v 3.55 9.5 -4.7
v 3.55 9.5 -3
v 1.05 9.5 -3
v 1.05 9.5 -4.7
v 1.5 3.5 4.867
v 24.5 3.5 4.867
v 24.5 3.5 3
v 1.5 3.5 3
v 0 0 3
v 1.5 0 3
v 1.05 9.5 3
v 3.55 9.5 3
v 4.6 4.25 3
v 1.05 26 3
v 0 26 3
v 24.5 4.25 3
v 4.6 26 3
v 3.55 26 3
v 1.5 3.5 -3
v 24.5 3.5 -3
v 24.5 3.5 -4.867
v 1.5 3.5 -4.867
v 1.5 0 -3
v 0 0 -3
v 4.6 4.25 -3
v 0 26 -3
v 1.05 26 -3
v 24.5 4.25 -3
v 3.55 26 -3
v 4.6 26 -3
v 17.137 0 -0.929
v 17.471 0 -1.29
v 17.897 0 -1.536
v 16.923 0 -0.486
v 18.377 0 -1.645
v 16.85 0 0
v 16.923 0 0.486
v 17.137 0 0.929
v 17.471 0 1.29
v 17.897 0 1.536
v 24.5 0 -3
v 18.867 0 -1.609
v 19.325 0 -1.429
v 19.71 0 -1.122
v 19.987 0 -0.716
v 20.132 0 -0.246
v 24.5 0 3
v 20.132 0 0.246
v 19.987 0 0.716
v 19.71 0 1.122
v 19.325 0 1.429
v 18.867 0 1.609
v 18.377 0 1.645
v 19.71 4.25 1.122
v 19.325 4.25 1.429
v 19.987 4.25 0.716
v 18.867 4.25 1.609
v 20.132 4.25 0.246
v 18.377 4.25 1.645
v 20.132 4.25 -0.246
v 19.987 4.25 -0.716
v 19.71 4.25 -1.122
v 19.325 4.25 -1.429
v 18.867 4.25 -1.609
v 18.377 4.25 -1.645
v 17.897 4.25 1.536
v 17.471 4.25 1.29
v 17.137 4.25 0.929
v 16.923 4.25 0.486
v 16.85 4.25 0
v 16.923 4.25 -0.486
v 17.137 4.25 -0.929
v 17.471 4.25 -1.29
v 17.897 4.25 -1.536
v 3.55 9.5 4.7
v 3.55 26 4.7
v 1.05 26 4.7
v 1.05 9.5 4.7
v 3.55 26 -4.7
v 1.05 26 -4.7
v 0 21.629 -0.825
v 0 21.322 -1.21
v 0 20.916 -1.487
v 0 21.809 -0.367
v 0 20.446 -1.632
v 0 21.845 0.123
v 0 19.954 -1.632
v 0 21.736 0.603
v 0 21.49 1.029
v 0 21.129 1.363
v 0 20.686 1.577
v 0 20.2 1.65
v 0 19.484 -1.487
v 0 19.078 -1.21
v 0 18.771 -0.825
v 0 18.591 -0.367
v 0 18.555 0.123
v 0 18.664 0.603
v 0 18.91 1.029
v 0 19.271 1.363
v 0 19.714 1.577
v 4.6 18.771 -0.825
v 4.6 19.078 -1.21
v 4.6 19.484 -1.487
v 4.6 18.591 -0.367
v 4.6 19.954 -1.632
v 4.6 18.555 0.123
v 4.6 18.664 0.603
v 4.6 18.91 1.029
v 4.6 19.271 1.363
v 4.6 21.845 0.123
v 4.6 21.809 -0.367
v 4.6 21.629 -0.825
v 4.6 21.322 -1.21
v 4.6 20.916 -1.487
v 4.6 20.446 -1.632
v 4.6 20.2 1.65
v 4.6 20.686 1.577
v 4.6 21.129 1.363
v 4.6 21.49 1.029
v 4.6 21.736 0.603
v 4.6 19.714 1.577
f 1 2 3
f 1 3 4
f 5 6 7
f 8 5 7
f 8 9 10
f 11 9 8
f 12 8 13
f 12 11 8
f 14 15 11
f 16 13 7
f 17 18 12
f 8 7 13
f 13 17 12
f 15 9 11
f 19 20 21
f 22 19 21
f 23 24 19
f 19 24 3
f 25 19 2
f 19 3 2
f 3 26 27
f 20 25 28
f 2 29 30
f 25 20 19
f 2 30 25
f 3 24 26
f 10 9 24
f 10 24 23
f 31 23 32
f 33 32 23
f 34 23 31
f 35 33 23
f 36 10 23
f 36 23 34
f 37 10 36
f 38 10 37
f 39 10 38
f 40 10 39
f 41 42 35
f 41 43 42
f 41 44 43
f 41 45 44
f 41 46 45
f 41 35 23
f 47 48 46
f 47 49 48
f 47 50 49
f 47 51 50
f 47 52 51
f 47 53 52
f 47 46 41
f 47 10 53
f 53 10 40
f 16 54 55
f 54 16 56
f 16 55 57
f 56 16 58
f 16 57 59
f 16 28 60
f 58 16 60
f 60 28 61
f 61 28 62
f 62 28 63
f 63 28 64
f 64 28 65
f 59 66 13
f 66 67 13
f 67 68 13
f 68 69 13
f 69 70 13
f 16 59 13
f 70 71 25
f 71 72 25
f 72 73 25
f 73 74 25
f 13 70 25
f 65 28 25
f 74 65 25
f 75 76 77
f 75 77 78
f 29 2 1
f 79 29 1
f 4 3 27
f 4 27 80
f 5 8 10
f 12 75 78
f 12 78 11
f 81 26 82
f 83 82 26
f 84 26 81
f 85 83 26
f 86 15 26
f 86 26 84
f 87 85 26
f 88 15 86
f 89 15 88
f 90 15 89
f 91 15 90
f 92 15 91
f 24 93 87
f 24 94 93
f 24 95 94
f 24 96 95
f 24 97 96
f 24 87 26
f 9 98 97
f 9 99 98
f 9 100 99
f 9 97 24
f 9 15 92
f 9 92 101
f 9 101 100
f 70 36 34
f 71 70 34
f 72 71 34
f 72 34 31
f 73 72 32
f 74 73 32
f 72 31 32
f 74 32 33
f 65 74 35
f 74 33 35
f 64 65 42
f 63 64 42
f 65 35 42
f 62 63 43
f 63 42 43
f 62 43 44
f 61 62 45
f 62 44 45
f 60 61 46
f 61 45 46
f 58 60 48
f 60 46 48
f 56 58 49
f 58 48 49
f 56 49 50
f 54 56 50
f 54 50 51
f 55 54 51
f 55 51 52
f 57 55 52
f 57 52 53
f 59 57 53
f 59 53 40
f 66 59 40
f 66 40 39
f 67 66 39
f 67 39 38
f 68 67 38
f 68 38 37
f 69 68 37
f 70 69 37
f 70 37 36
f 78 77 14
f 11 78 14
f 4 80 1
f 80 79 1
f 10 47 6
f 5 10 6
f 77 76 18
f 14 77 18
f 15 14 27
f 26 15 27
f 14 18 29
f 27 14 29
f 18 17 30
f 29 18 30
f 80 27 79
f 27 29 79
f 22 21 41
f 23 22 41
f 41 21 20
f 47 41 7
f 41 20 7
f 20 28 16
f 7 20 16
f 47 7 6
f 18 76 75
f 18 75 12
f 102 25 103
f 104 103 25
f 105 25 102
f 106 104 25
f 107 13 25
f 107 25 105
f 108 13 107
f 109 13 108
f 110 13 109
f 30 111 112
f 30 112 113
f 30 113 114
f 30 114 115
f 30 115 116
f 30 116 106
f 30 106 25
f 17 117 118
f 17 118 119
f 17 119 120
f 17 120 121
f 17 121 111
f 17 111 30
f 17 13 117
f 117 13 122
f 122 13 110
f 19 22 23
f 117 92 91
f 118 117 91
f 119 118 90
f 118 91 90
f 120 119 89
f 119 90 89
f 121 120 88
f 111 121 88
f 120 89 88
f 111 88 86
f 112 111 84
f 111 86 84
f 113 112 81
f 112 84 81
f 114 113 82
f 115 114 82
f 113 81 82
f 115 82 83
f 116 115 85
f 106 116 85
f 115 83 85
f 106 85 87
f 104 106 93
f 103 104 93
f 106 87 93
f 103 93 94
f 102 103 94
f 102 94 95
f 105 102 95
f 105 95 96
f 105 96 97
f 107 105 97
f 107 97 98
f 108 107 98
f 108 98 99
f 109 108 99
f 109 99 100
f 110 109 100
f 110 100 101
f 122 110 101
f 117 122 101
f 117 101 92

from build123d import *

# Parameters (mm, degrees)
BOSS_EXTRUDE1_DEPTH   = 3
BOSS_EXTRUDE2_DEPTH   = 24
SKETCH3_W             = 1.3
SKETCH3_H             = 10.4
BOSS_EXTRUDE3_DEPTH   = 16.5
M4X0_7_TAPPED_HOLE1_D = 3.3
M4X0_7_TAPPED_HOLE2_D = 3.3
SKETCH9_W             = 3
SKETCH9_H             = 3
CUT_EXTRUDE1_DEPTH    = 38.329478968
MOVE_FACE1_BY         = 0.75
MOVE_FACE2_BY         = 0.4
MOVE_FACE3_BY         = 0.75
MOVE_FACE3_2_BY       = 0.75
MOVE_FACE4_BY         = 0.45
MOVE_FACE4_2_BY       = 0.45
MOVE_FACE5_BY         = 0.5
MOVE_FACE5_2_BY       = 0.5
MOVE_FACE6_BY         = 1
MOVE_FACE8_BY         = 0.25
MOVE_FACE8_2_BY       = 0.25


with BuildPart() as part:
    # Sketch1 → Boss-Extrude1 (new, symmetric)
    with BuildSketch(Plane.XY):
        with BuildLine():
            Line((0, 26), (0, 0))
            Line((0, 0), (25.5, 0))
            Line((25.5, 0), (25.5, 5))
            Line((25.5, 5), (8, 5))
            ThreePointArc((8, 5), (5.878679656, 5.878679656), (5, 8))
            Line((5, 8), (5, 26))
            Line((5, 26), (0, 26))
        make_face()
    extrude(amount=BOSS_EXTRUDE1_DEPTH, both=True)

    # Sketch2 → Boss-Extrude2 (add)
    with BuildSketch(Plane(origin=(25.5, 0, 0), x_dir=(0, 0, -1), z_dir=(1, 0, 0))):
        Polygon((-3, 0), (-5, 3.75), (5, 3.75), (3, 0), align=None)
    extrude(amount=-BOSS_EXTRUDE2_DEPTH)

    # Sketch3 → Boss-Extrude3 (add)
    with BuildSketch(Plane(origin=(0, 26, 0), x_dir=(1, 0, 0), z_dir=(0, 1, 0))):
        with Locations((2.15, 0)):
            Rectangle(SKETCH3_W, SKETCH3_H)
    extrude(amount=-BOSS_EXTRUDE3_DEPTH)

    # M4x0.7 Tapped Hole1 (through all)
    with Locations(Plane(origin=(0, 5, 0), x_dir=(1, 0, 0), z_dir=(0, 1, 0))):
        with Locations((18.5, 0)):
            Hole(M4X0_7_TAPPED_HOLE1_D / 2)

    # M4x0.7 Tapped Hole2 (through all)
    with Locations(Plane(origin=(5, 0, 0), x_dir=(0, 0, -1), z_dir=(1, 0, 0))):
        with Locations((0, 20.2)):
            Hole(M4X0_7_TAPPED_HOLE2_D / 2)

    # Sketch9 → Cut-Extrude1 (cut, through all)
    with BuildSketch(Plane(origin=(0, 0, -3), x_dir=(-1, 0, 0), z_dir=(0, 0, -1))):
        with Locations((-6.5, 6.5)):
            Rectangle(SKETCH9_W, SKETCH9_H)
    extrude(amount=-CUT_EXTRUDE1_DEPTH, mode=Mode.SUBTRACT)

    # Move Face1: a face moved inward by 0.75
    extrude(part.faces().sort_by_distance((15.007117259, 5, 0))[0], amount=MOVE_FACE1_BY, dir=(0, -1, 0), mode=Mode.SUBTRACT)

    # Move Face2: a face moved inward by 0.4
    extrude(part.faces().sort_by_distance((5, 14.769055213, 0))[0], amount=MOVE_FACE2_BY, dir=(-1, 0, 0), mode=Mode.SUBTRACT)

    # Move Face3: a face moved outward by 0.75
    extrude(part.faces().sort_by_distance((2.8, 17.75, 4.1))[0], amount=MOVE_FACE3_BY, dir=(1, 0, 0))

    # Move Face3 2: a face moved outward by 0.75
    extrude(part.faces().sort_by_distance((2.8, 17.75, -4.1))[0], amount=MOVE_FACE3_2_BY, dir=(1, 0, 0))

    # Move Face4: a face moved outward by 0.45
    extrude(part.faces().sort_by_distance((1.5, 17.75, 4.1))[0], amount=MOVE_FACE4_BY, dir=(-1, 0, 0))

    # Move Face4 2: a face moved outward by 0.45
    extrude(part.faces().sort_by_distance((1.5, 17.75, -4.1))[0], amount=MOVE_FACE4_2_BY, dir=(-1, 0, 0))

    # Move Face5: a face moved inward by 0.5
    extrude(part.faces().sort_by_distance((2.3, 17.75, 5.2))[0], amount=MOVE_FACE5_BY, dir=(0, 0, -1), mode=Mode.SUBTRACT)

    # Move Face5 2: a face moved inward by 0.5
    extrude(part.faces().sort_by_distance((2.3, 17.75, -5.2))[0], amount=MOVE_FACE5_2_BY, dir=(0, 0, 1), mode=Mode.SUBTRACT)

    # Move Face6: a face moved inward by 1.0
    extrude(part.faces().sort_by_distance((25.5, 2.210227273, 0))[0], amount=MOVE_FACE6_BY, dir=(-1, 0, 0), mode=Mode.SUBTRACT)

    # Move Face8: a face moved inward by 0.25
    extrude(part.faces().sort_by_distance((13, 3.75, -4))[0], amount=MOVE_FACE8_BY, dir=(0, -1, 0), mode=Mode.SUBTRACT)

    # Move Face8 2: a face moved inward by 0.25
    extrude(part.faces().sort_by_distance((13, 3.75, 4))[0], amount=MOVE_FACE8_2_BY, dir=(0, -1, 0), mode=Mode.SUBTRACT)


solid = part.part
